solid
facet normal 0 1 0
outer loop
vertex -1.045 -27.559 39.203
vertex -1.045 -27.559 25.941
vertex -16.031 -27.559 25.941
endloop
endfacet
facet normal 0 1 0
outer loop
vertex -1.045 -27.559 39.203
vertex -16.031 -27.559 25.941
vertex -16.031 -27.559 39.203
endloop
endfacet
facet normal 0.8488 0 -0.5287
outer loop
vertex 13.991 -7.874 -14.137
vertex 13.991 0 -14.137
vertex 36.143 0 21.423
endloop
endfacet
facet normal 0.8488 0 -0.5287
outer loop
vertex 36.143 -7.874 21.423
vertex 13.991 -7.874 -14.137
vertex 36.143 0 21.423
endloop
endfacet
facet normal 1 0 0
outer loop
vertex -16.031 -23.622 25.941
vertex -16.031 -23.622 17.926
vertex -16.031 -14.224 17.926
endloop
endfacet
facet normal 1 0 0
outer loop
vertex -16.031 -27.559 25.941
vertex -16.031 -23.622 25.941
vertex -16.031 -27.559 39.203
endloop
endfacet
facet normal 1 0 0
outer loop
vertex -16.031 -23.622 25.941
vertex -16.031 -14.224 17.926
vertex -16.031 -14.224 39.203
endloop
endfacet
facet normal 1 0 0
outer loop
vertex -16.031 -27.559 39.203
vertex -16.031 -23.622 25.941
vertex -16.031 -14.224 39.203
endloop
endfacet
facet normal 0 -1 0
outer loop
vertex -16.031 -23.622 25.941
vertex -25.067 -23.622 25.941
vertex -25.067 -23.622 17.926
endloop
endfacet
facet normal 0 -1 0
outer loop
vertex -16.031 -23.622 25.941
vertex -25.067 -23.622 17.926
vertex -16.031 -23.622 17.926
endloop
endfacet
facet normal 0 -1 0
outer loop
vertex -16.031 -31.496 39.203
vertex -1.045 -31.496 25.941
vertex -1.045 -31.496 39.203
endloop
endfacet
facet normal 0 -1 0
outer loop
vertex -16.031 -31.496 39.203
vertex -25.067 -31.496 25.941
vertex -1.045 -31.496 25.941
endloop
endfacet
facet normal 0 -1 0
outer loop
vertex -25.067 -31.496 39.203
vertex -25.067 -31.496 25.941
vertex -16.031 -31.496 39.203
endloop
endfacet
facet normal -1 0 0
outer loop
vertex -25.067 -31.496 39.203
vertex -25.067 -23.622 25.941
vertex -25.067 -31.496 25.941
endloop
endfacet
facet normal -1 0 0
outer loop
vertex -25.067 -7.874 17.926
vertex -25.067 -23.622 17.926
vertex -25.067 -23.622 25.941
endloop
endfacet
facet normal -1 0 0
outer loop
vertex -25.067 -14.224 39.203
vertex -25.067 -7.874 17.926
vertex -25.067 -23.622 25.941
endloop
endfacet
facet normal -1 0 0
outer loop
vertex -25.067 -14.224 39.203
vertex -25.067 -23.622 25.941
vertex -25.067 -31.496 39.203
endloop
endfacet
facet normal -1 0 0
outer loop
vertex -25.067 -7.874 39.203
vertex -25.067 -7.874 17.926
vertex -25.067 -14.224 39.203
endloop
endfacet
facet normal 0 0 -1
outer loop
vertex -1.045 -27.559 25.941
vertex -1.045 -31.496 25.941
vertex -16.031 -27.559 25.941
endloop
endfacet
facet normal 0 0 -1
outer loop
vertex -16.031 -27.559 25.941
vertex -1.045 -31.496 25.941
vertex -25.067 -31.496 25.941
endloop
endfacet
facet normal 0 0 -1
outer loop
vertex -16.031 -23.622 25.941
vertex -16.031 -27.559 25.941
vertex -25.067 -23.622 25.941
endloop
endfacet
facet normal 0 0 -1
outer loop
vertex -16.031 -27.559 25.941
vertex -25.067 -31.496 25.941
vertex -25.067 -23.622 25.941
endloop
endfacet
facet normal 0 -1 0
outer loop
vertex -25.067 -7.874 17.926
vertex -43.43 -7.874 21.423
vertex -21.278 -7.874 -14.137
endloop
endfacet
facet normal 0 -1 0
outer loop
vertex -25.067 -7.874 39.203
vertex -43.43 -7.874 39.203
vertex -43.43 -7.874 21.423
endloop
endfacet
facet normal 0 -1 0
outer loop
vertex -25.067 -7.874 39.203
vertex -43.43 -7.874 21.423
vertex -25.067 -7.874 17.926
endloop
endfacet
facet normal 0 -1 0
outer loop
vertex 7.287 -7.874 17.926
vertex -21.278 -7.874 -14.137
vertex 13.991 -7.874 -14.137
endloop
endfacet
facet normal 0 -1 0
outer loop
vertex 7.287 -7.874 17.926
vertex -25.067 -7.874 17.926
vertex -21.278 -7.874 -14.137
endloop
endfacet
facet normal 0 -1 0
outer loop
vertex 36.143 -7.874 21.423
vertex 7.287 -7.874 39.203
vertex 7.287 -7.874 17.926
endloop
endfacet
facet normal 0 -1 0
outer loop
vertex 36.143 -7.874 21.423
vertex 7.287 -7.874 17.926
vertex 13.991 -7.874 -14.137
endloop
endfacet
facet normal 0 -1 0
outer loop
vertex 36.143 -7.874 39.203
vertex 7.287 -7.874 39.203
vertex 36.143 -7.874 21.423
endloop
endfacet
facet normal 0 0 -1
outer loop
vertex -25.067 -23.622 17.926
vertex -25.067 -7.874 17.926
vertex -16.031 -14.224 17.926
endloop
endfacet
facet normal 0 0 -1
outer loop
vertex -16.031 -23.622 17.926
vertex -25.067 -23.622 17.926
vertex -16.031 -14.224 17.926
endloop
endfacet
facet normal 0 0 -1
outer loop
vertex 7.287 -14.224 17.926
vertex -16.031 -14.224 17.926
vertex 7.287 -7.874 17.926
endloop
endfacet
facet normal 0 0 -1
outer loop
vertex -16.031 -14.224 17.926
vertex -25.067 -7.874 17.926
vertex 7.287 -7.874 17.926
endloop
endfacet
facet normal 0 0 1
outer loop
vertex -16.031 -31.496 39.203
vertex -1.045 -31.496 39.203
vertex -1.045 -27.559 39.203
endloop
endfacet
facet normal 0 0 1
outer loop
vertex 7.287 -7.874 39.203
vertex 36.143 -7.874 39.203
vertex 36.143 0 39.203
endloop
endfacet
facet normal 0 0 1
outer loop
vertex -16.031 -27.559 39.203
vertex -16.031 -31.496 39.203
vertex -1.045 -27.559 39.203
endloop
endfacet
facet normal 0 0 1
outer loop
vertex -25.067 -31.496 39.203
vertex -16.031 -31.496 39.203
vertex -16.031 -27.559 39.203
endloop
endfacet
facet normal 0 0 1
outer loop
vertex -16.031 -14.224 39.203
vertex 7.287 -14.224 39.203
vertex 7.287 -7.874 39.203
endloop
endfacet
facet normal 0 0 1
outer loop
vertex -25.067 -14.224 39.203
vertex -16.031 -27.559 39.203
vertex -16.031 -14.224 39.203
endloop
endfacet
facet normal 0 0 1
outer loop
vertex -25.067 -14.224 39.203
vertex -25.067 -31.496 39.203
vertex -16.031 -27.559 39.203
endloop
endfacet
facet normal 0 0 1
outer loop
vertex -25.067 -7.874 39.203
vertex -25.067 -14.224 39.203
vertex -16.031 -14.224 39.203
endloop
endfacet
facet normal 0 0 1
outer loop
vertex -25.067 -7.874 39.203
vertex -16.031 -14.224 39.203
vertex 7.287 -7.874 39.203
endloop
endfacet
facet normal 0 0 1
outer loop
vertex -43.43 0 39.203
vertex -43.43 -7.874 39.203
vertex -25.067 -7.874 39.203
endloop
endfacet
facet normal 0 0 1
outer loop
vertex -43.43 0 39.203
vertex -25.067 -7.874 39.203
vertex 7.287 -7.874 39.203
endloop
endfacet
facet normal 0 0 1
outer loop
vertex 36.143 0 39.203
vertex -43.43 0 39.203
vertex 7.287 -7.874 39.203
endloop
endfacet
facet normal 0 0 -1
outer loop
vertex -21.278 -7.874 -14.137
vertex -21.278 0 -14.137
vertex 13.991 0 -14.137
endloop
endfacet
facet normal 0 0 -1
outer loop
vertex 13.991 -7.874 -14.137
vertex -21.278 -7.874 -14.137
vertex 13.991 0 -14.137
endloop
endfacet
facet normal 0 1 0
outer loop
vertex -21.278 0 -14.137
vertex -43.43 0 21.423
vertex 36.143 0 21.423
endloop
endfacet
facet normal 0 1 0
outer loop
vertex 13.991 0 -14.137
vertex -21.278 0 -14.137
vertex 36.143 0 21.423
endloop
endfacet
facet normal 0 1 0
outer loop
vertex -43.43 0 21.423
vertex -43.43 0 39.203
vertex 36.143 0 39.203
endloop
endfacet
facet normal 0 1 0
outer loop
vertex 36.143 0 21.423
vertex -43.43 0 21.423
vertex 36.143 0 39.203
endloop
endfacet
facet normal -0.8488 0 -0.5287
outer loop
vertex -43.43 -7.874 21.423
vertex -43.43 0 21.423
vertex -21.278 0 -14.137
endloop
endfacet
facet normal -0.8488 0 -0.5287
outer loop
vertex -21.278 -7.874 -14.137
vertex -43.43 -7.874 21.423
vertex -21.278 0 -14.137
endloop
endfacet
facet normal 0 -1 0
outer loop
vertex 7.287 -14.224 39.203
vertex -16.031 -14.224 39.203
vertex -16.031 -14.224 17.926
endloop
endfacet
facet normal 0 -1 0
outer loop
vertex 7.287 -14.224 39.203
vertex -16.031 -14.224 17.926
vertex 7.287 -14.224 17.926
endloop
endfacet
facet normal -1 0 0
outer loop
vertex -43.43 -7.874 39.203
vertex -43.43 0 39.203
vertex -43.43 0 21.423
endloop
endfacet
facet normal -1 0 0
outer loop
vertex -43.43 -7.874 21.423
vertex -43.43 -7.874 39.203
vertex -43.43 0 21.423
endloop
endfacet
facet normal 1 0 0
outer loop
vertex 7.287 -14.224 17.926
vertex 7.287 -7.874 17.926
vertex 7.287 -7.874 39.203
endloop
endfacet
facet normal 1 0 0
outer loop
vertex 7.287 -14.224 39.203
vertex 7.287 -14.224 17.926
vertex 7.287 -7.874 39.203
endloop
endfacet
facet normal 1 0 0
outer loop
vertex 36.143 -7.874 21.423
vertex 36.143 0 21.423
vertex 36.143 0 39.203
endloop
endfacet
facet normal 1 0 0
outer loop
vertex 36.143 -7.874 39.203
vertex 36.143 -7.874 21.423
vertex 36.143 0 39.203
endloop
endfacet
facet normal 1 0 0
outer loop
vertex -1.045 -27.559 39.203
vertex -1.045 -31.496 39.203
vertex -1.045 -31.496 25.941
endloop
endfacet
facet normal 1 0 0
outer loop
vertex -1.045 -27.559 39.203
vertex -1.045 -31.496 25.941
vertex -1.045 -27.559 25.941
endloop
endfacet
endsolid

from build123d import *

# Parameters (mm, degrees)
F1_DEPTH = 7.874
F2_W     = 8.7442621589
F2_H     = 21.2777052075
F2_W_2   = 23.6095096916
F3_DEPTH = 6.35
F4_W     = 9.0357400477
F4_H     = 21.2777052075
F5_DEPTH = 17.272
F6_W     = 9.0357400477
F6_H     = 8.01557675
F7_DEPTH = 7.874
F8_W     = 3.937
F8_H     = 13.2621284574
F9_DEPTH = 14.986


with BuildPart() as f1:
    # F0 (on Front) → F1 (new body)
    with BuildSketch(Plane.XZ):
        Polygon((36.1429499462, 39.2034426332), (-43.4298366308, 39.2034426332), (-43.4298366308, 21.4234422892), (-21.2777052075, -14.1365574673), (13.9908185229, -14.1365574673), (36.1429499462, 21.4234422892), align=None)
    extrude(amount=F1_DEPTH)

    # F2 (on face) → F3 (join)
    with BuildSketch(Plane.XZ.offset(7.874)):
        with Locations((-20.6947550178, 28.5645900294)):
            Rectangle(F2_W, F2_H)
        with Locations((-4.5178690925, 28.5645900294)):
            Rectangle(F2_W_2, F2_H)
    extrude(amount=F3_DEPTH)

    # F4 (on face) → F5 (join)
    with BuildSketch(Plane.XZ.offset(14.224)):
        with Locations((-20.5490160733, 28.5645900294)):
            Rectangle(F4_W, F4_H)
    extrude(amount=F5_DEPTH)

    # F6 (on face) → F7 (cut)
    with BuildSketch(Plane.XZ.offset(31.496)):
        with Locations((-20.5490160733, 21.9335258007)):
            Rectangle(F6_W, F6_H)
    extrude(amount=-F7_DEPTH, mode=Mode.SUBTRACT)

    # F8 (on face) → F9 (join)
    with BuildSketch(Plane.YZ.offset(-16.0311460495)):
        with Locations((-29.5275, 32.5723784044)):
            Rectangle(F8_W, F8_H)
    extrude(amount=F9_DEPTH)


solid = f1.part
